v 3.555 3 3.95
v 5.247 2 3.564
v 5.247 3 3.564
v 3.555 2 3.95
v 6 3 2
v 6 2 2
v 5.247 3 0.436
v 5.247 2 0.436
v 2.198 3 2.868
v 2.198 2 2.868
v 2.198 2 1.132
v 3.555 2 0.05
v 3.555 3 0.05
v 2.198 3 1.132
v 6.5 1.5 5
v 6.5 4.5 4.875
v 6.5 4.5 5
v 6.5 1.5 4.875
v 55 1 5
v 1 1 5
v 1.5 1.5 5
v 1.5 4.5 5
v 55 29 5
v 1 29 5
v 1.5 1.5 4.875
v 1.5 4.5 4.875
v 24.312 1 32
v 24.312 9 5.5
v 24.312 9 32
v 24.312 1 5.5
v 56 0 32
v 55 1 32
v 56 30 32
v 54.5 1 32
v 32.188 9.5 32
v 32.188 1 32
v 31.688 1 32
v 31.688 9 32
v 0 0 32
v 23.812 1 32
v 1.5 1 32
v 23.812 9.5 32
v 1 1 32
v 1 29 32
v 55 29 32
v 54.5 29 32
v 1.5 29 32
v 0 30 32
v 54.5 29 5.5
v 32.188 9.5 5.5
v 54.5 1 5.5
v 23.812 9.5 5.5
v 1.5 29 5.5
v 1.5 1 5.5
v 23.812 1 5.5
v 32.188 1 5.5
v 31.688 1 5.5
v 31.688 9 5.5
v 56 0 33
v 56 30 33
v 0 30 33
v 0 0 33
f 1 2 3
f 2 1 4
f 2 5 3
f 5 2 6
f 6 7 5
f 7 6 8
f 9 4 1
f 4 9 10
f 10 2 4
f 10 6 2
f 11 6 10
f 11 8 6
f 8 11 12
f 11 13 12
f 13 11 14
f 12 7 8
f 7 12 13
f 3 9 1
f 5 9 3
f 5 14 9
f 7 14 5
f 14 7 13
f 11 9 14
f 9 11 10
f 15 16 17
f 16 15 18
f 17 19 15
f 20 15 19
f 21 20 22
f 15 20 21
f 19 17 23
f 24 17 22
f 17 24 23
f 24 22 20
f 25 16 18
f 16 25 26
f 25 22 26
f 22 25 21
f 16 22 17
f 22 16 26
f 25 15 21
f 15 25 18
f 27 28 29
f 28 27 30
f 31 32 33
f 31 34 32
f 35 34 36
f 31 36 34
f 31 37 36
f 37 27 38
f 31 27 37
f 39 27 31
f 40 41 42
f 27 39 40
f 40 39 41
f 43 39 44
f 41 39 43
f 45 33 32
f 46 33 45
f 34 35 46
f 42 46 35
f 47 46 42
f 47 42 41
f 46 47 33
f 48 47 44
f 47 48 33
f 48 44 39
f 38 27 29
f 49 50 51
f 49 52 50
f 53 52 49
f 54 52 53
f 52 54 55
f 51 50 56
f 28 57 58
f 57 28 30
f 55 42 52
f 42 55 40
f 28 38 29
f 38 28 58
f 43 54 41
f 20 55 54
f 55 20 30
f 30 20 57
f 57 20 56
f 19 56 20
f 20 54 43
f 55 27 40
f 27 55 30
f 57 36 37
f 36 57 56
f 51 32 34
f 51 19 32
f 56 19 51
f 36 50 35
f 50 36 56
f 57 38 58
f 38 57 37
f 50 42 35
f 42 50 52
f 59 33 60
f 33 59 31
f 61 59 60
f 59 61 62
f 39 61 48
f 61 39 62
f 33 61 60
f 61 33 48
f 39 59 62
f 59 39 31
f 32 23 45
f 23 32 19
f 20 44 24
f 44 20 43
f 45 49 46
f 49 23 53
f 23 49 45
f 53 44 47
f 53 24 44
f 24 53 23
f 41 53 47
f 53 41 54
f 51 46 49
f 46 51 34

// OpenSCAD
// caster 

module caster() {
    translate([2.5, 1.5, 2])
    rotate([90, 0, 0])
    cylinder(1, 2, 2);
    
    translate([0, 0, 4.875])
    cube([5, 3, 0.125]);
}


module top() {
    translate([0, 0, 32])
    cube([56, 30, 1]);
}

module frame() {
    translate([1, 1, 5])
    cube([54, 28, 27]); 
}

module framebottom() {
    translate([1, 1, 5])
    cube([54, 28, 0.5]);
}

module frameside(position) {
    translate([position, 1, 5.5])
    cube([0.5, 28, 26.5]);
}

module batteryCompartmentSides(x) {
    translate([x, 1, 5.5])
    cube([0.5, 8, 26.5]);
    translate([x + 7.875, 1, 5.5])
    cube([0.5, 8, 26.5]);
    translate([x, 9, 5.5])
    cube([8.375, 0.5, 26.5]);
}


// 15, 19, 6

module packout() {
    
}
translate([1.5, 1.5, 0])
caster();
top();
%frame();
framebottom();
frameside(1);
frameside(54.5);
batteryCompartmentSides(23.8125);
